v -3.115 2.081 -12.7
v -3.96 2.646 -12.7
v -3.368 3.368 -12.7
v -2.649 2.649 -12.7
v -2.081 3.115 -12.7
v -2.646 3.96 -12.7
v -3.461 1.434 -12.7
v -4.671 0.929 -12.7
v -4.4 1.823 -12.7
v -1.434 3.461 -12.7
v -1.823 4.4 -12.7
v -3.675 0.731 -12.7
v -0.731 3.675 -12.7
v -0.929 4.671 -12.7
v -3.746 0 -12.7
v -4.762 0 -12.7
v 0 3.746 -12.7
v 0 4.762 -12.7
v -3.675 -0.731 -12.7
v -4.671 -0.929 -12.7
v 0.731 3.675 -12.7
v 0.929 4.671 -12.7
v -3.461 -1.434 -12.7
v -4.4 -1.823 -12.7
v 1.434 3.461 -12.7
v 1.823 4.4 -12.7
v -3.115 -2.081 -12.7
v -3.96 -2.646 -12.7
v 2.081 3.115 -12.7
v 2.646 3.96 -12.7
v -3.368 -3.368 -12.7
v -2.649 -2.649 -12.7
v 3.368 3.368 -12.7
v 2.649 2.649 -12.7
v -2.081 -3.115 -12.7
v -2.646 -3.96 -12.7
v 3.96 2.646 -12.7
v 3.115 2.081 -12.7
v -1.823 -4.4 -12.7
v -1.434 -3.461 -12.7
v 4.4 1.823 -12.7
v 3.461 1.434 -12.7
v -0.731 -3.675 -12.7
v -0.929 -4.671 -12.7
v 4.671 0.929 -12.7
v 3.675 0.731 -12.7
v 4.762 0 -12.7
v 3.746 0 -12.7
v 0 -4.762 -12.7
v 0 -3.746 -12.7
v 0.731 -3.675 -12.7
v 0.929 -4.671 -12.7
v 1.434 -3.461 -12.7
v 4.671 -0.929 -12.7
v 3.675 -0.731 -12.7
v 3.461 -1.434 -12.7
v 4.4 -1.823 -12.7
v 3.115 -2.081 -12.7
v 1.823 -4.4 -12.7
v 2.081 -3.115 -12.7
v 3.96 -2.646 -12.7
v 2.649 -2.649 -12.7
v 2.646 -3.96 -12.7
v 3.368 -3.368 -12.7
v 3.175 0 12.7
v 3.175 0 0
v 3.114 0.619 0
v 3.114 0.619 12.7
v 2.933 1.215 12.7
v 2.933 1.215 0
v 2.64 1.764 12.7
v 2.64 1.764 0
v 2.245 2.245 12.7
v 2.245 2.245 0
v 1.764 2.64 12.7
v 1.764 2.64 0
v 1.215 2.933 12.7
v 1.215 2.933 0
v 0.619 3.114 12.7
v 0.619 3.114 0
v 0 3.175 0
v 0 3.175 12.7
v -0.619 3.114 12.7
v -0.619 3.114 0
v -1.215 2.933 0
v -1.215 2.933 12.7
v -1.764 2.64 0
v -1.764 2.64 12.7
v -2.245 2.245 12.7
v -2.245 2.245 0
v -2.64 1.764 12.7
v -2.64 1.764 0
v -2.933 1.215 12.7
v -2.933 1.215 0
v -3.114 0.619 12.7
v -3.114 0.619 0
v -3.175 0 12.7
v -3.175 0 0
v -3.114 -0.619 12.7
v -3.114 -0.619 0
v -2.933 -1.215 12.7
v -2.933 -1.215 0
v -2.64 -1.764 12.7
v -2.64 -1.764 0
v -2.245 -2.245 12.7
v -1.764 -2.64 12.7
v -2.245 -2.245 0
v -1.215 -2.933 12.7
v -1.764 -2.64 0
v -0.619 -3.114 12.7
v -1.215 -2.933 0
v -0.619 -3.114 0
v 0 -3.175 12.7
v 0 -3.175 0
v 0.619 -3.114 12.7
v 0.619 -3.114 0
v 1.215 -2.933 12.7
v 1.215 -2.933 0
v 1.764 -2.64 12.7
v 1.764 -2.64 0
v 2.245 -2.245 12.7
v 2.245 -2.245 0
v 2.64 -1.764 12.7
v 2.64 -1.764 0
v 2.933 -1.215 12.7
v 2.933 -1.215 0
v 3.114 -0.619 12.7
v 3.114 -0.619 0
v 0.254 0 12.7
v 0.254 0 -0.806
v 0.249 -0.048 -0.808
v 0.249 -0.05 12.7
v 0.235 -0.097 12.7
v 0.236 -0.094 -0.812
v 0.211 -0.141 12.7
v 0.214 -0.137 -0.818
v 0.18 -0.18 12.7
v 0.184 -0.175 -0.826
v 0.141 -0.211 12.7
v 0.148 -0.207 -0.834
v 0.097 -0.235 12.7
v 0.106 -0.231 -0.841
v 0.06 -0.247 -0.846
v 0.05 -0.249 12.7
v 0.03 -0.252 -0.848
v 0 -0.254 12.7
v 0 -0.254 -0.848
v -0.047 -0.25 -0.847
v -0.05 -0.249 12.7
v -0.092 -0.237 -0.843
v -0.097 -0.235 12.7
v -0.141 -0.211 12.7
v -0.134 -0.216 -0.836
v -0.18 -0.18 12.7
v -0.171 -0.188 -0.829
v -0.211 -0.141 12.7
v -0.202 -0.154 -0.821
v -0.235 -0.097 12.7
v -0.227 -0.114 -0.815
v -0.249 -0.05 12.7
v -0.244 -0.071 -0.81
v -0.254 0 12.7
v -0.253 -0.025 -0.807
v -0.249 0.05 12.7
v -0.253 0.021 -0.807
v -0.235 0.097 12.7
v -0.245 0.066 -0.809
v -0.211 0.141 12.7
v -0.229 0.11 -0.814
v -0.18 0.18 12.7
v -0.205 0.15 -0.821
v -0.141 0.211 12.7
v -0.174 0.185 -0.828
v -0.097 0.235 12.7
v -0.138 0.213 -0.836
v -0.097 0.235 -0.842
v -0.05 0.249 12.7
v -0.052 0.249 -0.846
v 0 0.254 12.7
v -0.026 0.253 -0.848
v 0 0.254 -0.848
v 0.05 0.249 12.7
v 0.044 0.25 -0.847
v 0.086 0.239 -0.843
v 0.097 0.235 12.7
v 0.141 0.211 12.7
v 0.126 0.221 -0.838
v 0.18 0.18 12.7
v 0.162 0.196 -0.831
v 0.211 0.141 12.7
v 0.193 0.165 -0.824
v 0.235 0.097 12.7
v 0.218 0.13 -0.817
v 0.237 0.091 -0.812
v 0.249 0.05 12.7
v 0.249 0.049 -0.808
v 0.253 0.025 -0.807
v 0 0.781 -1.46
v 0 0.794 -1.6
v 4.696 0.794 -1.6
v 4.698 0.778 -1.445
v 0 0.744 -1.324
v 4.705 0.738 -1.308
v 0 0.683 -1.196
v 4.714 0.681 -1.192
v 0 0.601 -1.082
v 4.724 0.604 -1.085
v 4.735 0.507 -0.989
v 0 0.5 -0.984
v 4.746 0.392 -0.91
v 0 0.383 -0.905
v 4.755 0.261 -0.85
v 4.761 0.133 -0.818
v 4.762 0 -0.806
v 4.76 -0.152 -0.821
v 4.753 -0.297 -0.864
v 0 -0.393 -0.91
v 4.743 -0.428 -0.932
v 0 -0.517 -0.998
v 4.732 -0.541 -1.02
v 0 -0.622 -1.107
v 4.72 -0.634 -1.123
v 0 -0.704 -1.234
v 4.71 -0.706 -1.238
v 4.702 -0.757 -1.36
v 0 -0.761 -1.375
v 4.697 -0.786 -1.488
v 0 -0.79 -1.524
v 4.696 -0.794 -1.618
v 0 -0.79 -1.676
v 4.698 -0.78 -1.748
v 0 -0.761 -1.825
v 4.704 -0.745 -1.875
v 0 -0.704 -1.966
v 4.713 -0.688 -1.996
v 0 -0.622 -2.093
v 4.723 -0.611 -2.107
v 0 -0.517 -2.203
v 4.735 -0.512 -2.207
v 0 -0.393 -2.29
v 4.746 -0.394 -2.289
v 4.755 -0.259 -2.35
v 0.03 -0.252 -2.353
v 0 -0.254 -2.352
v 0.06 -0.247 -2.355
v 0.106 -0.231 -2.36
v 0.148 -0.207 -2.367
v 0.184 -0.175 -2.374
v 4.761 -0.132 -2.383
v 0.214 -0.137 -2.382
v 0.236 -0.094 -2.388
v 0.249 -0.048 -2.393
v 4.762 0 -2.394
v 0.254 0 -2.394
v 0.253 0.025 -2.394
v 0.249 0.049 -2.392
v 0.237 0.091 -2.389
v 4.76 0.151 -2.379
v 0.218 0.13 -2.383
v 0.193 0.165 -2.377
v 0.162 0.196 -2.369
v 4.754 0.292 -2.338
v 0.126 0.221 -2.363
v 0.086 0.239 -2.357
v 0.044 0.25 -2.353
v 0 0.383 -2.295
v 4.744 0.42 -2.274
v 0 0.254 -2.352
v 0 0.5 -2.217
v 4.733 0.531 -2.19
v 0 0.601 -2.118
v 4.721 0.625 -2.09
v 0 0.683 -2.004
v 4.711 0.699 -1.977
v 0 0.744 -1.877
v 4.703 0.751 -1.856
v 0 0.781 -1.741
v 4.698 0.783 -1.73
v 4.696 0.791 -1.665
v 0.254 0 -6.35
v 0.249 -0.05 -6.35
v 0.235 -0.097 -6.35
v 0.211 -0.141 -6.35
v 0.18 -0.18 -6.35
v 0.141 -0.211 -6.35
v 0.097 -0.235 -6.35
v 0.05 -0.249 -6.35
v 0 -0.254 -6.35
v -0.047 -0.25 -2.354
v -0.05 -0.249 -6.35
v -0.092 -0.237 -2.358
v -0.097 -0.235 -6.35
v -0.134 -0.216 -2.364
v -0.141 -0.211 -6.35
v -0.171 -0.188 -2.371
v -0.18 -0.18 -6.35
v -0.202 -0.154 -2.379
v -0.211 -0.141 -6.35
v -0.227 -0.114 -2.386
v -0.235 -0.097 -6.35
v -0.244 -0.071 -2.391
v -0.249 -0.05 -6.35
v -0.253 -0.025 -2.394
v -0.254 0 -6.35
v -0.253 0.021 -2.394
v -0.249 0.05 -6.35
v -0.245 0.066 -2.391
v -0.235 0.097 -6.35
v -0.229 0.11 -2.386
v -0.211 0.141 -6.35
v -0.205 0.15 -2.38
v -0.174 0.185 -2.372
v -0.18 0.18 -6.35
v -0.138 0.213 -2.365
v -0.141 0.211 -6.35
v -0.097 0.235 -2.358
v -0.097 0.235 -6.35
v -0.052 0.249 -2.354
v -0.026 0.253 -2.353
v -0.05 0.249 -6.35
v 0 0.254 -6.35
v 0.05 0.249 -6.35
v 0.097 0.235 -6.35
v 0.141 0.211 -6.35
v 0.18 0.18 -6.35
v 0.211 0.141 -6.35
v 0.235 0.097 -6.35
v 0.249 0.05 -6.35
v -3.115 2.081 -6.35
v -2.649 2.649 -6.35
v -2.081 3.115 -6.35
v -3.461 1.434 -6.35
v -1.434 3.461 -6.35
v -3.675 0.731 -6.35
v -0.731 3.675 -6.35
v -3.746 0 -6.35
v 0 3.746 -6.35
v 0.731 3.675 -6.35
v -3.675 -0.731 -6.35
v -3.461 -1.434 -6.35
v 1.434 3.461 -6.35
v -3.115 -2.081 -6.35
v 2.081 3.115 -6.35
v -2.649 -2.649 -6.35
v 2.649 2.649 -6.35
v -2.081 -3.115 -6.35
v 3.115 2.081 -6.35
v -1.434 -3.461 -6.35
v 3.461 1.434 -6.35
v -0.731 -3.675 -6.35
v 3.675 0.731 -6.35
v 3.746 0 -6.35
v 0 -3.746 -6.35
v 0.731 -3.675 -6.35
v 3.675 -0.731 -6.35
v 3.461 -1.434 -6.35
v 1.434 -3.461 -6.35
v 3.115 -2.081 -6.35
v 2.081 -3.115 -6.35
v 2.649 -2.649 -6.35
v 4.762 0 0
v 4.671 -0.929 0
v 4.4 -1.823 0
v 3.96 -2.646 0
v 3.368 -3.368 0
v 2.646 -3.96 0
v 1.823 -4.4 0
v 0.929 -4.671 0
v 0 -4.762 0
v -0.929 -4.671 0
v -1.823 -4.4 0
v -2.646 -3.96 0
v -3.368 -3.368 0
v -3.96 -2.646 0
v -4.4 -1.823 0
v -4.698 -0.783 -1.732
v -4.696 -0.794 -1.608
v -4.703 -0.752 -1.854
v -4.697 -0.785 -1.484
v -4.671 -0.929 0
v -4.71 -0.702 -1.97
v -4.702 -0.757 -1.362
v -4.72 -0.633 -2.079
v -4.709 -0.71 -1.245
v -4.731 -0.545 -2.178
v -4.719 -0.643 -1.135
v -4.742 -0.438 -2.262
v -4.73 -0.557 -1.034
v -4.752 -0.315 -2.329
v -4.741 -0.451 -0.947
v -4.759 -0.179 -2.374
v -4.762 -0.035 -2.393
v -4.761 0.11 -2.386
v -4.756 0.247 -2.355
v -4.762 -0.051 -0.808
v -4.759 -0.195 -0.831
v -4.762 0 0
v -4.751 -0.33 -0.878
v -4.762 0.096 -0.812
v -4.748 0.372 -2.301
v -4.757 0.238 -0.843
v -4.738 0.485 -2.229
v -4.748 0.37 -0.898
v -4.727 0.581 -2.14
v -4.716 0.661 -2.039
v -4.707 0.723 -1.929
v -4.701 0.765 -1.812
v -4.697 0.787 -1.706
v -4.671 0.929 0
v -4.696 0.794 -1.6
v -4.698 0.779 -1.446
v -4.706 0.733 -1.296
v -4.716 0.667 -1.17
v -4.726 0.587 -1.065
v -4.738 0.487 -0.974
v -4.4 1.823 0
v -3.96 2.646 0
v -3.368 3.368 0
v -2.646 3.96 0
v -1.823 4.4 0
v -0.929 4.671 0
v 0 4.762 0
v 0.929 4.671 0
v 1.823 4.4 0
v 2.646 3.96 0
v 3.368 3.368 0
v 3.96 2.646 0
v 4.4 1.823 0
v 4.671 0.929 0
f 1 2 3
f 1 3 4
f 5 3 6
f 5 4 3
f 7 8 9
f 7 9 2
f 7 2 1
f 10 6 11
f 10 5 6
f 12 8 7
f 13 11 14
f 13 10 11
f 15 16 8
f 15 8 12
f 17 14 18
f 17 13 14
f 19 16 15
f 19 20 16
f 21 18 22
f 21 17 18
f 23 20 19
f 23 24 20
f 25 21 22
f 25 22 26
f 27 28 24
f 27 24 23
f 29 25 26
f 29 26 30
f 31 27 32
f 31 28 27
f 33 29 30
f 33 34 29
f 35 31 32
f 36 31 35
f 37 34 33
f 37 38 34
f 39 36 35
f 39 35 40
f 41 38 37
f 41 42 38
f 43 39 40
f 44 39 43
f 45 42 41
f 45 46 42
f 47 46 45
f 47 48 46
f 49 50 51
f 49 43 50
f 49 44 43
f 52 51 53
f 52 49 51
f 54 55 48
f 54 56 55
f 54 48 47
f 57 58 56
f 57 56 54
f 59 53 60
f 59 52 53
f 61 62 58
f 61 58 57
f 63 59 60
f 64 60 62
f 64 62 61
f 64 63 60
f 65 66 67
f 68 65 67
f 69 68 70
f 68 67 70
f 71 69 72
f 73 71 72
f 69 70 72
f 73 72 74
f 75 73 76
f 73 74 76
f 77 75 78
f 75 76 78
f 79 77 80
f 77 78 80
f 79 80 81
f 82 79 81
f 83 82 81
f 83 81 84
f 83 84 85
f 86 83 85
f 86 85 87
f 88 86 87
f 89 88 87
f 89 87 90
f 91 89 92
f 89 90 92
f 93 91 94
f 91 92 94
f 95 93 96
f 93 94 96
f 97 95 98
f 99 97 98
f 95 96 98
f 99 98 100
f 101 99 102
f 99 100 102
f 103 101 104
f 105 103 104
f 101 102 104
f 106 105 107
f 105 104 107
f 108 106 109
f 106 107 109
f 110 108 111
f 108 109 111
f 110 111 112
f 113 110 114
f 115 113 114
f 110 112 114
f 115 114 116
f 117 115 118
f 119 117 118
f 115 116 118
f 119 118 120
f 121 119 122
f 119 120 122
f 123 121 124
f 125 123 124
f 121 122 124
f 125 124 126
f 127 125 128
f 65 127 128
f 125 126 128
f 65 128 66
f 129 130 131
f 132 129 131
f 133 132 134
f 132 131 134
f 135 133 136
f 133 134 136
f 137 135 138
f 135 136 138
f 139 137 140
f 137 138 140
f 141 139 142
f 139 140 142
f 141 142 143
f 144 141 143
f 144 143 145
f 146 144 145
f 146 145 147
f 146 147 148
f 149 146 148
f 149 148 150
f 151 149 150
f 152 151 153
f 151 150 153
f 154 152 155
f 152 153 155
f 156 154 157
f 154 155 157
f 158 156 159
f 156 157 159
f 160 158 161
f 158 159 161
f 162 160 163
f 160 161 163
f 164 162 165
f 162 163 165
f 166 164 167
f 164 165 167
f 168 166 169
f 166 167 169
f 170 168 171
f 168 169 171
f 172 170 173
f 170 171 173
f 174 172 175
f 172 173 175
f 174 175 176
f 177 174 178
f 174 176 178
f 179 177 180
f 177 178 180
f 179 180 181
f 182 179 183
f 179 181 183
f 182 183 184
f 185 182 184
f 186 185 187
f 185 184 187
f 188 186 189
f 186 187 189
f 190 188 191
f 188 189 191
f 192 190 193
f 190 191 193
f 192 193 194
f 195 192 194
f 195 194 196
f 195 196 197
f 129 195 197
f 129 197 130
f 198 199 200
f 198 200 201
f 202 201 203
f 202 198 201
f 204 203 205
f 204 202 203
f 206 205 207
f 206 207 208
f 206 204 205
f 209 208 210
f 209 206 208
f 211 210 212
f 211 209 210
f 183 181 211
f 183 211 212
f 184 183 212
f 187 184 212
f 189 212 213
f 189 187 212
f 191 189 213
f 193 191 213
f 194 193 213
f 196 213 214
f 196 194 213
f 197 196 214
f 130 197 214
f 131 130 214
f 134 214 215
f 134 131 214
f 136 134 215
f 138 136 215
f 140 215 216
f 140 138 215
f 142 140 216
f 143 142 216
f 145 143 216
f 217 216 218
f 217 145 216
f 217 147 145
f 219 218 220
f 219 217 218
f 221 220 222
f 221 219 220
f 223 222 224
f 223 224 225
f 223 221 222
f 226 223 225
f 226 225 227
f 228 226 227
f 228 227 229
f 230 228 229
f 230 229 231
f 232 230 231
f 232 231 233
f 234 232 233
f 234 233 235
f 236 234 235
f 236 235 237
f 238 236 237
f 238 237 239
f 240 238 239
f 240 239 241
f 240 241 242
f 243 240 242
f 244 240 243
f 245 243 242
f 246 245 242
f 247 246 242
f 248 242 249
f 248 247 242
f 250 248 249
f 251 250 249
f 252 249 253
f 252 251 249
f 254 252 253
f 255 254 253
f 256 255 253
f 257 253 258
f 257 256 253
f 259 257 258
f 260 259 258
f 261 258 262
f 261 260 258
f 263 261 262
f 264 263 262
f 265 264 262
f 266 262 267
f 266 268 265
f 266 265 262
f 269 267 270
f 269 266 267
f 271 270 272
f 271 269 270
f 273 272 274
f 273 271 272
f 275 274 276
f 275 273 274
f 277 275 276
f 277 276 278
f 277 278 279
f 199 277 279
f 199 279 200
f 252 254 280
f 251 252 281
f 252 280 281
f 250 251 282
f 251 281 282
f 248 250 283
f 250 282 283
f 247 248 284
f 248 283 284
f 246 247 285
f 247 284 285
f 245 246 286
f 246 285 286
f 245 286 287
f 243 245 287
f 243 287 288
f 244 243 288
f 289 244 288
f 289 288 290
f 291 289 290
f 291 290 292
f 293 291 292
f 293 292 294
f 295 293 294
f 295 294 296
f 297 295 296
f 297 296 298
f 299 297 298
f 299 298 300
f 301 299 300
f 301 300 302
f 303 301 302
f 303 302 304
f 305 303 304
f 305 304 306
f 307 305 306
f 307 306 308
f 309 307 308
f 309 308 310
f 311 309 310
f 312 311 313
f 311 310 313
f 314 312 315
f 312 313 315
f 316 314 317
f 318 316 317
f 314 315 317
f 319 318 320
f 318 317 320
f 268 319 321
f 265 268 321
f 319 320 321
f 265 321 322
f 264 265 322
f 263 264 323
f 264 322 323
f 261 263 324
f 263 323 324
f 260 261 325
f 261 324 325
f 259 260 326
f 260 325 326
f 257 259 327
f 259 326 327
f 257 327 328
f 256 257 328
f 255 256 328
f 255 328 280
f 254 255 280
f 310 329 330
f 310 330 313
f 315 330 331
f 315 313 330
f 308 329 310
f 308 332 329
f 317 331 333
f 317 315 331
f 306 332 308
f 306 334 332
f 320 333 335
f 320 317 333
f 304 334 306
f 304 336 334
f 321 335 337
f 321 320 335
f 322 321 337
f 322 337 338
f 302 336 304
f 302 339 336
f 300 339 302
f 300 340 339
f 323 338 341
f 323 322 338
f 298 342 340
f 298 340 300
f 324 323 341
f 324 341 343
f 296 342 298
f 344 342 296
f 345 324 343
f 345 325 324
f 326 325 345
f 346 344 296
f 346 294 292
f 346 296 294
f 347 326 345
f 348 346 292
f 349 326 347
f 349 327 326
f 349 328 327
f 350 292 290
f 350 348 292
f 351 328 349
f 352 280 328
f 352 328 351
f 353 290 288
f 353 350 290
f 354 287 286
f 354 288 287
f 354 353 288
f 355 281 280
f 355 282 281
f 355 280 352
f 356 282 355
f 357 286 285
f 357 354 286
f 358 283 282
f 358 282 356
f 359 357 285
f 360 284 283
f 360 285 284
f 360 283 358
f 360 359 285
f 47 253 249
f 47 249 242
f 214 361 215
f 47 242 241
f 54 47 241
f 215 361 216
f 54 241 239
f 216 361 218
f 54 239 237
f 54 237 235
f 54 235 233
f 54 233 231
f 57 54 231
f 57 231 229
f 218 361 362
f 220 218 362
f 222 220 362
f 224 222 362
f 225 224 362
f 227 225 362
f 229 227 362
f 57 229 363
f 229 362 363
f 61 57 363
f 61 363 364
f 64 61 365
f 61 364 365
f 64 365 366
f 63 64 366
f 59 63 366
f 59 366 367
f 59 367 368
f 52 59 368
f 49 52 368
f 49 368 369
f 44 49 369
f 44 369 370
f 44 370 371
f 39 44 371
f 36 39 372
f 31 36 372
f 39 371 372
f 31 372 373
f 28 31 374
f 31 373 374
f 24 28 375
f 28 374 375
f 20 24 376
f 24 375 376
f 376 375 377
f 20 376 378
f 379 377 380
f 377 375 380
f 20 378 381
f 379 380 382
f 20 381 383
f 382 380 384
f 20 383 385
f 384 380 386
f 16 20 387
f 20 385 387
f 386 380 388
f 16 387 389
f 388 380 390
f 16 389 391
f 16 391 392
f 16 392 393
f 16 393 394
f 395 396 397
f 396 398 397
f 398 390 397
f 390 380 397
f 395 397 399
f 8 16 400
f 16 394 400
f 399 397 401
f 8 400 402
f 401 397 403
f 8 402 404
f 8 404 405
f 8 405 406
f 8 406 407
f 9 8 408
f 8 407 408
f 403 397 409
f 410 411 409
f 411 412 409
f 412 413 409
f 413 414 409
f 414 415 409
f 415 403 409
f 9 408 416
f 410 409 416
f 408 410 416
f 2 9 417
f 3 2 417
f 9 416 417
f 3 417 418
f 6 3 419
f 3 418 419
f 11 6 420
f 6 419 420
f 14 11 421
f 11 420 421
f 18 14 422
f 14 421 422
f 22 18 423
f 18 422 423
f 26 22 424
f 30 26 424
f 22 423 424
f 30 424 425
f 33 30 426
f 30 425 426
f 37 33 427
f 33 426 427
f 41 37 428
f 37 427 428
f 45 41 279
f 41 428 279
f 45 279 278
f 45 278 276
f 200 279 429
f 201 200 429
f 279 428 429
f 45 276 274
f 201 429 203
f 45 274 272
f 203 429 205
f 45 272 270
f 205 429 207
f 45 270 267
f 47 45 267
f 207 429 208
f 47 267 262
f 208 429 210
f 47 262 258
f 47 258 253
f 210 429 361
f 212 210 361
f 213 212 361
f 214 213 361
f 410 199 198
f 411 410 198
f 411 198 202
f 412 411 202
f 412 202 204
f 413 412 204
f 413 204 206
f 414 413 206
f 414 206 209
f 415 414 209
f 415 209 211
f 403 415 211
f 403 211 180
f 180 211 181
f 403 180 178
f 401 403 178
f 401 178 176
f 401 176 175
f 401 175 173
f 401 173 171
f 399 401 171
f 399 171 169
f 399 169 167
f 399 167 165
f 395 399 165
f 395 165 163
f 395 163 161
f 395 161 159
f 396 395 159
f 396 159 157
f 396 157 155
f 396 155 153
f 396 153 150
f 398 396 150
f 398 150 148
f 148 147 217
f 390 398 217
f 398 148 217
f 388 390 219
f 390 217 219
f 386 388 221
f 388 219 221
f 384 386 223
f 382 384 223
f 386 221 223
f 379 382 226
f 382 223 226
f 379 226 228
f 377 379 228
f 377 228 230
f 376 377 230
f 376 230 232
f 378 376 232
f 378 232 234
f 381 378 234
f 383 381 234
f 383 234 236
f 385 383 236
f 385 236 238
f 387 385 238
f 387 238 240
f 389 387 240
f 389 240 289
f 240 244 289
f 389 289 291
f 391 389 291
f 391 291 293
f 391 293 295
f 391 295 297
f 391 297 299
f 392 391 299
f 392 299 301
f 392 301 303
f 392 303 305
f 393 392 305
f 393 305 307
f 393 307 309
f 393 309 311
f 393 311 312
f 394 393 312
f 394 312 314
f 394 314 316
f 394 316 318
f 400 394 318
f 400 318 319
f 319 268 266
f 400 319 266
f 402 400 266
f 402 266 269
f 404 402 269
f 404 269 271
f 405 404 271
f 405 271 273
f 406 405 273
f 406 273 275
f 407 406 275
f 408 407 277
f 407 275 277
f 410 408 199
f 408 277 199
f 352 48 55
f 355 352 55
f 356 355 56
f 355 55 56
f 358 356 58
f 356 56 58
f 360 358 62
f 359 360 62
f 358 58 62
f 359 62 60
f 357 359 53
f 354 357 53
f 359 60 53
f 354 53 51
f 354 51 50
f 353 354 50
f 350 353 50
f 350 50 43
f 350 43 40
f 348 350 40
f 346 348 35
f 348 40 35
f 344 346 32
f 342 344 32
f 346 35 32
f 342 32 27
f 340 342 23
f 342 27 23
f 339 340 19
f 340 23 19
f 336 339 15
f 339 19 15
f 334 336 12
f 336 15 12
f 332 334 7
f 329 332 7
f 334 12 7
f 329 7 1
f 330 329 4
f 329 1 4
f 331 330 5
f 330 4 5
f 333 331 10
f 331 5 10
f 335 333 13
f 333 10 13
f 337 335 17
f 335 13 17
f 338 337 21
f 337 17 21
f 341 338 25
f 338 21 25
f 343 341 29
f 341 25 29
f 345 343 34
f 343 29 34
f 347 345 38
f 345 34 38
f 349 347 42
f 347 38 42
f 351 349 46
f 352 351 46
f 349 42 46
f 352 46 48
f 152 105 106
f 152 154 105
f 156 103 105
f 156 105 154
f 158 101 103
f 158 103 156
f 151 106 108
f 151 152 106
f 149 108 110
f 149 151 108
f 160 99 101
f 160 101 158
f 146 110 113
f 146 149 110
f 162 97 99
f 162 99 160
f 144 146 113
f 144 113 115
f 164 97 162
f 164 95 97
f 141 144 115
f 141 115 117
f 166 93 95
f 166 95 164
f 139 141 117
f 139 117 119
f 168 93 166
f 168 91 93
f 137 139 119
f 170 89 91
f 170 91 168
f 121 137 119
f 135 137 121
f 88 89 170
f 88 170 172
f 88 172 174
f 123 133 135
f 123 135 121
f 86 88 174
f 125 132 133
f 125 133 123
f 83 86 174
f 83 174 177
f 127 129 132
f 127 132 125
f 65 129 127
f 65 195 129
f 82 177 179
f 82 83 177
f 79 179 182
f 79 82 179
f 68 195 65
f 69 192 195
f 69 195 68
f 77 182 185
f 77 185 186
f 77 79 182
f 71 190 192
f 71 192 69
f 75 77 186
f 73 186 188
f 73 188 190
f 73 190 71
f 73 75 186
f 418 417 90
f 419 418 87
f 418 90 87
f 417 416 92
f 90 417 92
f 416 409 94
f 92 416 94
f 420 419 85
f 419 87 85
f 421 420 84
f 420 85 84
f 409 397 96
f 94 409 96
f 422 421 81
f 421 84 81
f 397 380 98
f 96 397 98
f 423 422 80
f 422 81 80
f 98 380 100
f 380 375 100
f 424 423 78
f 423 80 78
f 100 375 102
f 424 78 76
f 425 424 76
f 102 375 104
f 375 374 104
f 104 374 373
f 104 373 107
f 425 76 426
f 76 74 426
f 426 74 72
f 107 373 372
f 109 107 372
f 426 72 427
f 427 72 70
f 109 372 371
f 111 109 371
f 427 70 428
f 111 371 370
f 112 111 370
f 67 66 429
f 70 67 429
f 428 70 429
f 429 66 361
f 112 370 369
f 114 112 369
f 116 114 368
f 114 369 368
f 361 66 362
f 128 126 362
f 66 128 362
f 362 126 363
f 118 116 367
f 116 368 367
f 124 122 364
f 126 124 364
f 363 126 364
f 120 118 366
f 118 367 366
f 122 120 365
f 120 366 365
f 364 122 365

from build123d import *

# Parameters (mm, degrees)
F0_R          = 3.175
F1_DEPTH      = 12.7
F2_R          = 4.7625
F2_R_2        = 3.175
F3_DEPTH      = 12.7
F4_R          = 0.254
F5_DEPTH      = 25.4
F6_R          = 3.7465
F6_R_2        = 0.254
F7_DEPTH      = 6.35
F8_R          = 0.79375
F9_DEPTH      = 4.7635
F9_DEPTH_BACK = 4.7635


with BuildPart() as f1:
    # F0 (on Top) → F1 (new body)
    with BuildSketch(Plane.XY):
        Circle(F0_R)
    extrude(amount=F1_DEPTH)

    # F2 (on face) → F3 (join)
    with BuildSketch(Plane(origin=(0, 0, 0), x_dir=(1, 0, 0), z_dir=(0, 0, -1))):
        Circle(F2_R)
        Circle(F2_R_2, mode=Mode.SUBTRACT)
        Circle(F2_R_2)
    extrude(amount=F3_DEPTH)

    # F4 (on face) → F5 (cut)
    with BuildSketch(Plane(origin=(0, 0, -12.7), x_dir=(1, 0, 0), z_dir=(0, 0, -1))):
        Circle(F4_R)
    extrude(amount=-F5_DEPTH, mode=Mode.SUBTRACT)

    # F6 (on face) → F7 (cut)
    with BuildSketch(Plane(origin=(0, 0, -12.7), x_dir=(1, 0, 0), z_dir=(0, 0, -1))):
        Circle(F6_R)
        Circle(F6_R_2, mode=Mode.SUBTRACT)
    extrude(amount=-F7_DEPTH, mode=Mode.SUBTRACT)

    # F8 (on Right) → F9 (cut, two sides)
    with BuildSketch(Plane.YZ) as f9_sk:
        with Locations((0, -1.6002)):
            Circle(F8_R)
    extrude(amount=-F9_DEPTH, mode=Mode.SUBTRACT)
    extrude(f9_sk.sketch, amount=F9_DEPTH_BACK, mode=Mode.SUBTRACT)


solid = f1.part
